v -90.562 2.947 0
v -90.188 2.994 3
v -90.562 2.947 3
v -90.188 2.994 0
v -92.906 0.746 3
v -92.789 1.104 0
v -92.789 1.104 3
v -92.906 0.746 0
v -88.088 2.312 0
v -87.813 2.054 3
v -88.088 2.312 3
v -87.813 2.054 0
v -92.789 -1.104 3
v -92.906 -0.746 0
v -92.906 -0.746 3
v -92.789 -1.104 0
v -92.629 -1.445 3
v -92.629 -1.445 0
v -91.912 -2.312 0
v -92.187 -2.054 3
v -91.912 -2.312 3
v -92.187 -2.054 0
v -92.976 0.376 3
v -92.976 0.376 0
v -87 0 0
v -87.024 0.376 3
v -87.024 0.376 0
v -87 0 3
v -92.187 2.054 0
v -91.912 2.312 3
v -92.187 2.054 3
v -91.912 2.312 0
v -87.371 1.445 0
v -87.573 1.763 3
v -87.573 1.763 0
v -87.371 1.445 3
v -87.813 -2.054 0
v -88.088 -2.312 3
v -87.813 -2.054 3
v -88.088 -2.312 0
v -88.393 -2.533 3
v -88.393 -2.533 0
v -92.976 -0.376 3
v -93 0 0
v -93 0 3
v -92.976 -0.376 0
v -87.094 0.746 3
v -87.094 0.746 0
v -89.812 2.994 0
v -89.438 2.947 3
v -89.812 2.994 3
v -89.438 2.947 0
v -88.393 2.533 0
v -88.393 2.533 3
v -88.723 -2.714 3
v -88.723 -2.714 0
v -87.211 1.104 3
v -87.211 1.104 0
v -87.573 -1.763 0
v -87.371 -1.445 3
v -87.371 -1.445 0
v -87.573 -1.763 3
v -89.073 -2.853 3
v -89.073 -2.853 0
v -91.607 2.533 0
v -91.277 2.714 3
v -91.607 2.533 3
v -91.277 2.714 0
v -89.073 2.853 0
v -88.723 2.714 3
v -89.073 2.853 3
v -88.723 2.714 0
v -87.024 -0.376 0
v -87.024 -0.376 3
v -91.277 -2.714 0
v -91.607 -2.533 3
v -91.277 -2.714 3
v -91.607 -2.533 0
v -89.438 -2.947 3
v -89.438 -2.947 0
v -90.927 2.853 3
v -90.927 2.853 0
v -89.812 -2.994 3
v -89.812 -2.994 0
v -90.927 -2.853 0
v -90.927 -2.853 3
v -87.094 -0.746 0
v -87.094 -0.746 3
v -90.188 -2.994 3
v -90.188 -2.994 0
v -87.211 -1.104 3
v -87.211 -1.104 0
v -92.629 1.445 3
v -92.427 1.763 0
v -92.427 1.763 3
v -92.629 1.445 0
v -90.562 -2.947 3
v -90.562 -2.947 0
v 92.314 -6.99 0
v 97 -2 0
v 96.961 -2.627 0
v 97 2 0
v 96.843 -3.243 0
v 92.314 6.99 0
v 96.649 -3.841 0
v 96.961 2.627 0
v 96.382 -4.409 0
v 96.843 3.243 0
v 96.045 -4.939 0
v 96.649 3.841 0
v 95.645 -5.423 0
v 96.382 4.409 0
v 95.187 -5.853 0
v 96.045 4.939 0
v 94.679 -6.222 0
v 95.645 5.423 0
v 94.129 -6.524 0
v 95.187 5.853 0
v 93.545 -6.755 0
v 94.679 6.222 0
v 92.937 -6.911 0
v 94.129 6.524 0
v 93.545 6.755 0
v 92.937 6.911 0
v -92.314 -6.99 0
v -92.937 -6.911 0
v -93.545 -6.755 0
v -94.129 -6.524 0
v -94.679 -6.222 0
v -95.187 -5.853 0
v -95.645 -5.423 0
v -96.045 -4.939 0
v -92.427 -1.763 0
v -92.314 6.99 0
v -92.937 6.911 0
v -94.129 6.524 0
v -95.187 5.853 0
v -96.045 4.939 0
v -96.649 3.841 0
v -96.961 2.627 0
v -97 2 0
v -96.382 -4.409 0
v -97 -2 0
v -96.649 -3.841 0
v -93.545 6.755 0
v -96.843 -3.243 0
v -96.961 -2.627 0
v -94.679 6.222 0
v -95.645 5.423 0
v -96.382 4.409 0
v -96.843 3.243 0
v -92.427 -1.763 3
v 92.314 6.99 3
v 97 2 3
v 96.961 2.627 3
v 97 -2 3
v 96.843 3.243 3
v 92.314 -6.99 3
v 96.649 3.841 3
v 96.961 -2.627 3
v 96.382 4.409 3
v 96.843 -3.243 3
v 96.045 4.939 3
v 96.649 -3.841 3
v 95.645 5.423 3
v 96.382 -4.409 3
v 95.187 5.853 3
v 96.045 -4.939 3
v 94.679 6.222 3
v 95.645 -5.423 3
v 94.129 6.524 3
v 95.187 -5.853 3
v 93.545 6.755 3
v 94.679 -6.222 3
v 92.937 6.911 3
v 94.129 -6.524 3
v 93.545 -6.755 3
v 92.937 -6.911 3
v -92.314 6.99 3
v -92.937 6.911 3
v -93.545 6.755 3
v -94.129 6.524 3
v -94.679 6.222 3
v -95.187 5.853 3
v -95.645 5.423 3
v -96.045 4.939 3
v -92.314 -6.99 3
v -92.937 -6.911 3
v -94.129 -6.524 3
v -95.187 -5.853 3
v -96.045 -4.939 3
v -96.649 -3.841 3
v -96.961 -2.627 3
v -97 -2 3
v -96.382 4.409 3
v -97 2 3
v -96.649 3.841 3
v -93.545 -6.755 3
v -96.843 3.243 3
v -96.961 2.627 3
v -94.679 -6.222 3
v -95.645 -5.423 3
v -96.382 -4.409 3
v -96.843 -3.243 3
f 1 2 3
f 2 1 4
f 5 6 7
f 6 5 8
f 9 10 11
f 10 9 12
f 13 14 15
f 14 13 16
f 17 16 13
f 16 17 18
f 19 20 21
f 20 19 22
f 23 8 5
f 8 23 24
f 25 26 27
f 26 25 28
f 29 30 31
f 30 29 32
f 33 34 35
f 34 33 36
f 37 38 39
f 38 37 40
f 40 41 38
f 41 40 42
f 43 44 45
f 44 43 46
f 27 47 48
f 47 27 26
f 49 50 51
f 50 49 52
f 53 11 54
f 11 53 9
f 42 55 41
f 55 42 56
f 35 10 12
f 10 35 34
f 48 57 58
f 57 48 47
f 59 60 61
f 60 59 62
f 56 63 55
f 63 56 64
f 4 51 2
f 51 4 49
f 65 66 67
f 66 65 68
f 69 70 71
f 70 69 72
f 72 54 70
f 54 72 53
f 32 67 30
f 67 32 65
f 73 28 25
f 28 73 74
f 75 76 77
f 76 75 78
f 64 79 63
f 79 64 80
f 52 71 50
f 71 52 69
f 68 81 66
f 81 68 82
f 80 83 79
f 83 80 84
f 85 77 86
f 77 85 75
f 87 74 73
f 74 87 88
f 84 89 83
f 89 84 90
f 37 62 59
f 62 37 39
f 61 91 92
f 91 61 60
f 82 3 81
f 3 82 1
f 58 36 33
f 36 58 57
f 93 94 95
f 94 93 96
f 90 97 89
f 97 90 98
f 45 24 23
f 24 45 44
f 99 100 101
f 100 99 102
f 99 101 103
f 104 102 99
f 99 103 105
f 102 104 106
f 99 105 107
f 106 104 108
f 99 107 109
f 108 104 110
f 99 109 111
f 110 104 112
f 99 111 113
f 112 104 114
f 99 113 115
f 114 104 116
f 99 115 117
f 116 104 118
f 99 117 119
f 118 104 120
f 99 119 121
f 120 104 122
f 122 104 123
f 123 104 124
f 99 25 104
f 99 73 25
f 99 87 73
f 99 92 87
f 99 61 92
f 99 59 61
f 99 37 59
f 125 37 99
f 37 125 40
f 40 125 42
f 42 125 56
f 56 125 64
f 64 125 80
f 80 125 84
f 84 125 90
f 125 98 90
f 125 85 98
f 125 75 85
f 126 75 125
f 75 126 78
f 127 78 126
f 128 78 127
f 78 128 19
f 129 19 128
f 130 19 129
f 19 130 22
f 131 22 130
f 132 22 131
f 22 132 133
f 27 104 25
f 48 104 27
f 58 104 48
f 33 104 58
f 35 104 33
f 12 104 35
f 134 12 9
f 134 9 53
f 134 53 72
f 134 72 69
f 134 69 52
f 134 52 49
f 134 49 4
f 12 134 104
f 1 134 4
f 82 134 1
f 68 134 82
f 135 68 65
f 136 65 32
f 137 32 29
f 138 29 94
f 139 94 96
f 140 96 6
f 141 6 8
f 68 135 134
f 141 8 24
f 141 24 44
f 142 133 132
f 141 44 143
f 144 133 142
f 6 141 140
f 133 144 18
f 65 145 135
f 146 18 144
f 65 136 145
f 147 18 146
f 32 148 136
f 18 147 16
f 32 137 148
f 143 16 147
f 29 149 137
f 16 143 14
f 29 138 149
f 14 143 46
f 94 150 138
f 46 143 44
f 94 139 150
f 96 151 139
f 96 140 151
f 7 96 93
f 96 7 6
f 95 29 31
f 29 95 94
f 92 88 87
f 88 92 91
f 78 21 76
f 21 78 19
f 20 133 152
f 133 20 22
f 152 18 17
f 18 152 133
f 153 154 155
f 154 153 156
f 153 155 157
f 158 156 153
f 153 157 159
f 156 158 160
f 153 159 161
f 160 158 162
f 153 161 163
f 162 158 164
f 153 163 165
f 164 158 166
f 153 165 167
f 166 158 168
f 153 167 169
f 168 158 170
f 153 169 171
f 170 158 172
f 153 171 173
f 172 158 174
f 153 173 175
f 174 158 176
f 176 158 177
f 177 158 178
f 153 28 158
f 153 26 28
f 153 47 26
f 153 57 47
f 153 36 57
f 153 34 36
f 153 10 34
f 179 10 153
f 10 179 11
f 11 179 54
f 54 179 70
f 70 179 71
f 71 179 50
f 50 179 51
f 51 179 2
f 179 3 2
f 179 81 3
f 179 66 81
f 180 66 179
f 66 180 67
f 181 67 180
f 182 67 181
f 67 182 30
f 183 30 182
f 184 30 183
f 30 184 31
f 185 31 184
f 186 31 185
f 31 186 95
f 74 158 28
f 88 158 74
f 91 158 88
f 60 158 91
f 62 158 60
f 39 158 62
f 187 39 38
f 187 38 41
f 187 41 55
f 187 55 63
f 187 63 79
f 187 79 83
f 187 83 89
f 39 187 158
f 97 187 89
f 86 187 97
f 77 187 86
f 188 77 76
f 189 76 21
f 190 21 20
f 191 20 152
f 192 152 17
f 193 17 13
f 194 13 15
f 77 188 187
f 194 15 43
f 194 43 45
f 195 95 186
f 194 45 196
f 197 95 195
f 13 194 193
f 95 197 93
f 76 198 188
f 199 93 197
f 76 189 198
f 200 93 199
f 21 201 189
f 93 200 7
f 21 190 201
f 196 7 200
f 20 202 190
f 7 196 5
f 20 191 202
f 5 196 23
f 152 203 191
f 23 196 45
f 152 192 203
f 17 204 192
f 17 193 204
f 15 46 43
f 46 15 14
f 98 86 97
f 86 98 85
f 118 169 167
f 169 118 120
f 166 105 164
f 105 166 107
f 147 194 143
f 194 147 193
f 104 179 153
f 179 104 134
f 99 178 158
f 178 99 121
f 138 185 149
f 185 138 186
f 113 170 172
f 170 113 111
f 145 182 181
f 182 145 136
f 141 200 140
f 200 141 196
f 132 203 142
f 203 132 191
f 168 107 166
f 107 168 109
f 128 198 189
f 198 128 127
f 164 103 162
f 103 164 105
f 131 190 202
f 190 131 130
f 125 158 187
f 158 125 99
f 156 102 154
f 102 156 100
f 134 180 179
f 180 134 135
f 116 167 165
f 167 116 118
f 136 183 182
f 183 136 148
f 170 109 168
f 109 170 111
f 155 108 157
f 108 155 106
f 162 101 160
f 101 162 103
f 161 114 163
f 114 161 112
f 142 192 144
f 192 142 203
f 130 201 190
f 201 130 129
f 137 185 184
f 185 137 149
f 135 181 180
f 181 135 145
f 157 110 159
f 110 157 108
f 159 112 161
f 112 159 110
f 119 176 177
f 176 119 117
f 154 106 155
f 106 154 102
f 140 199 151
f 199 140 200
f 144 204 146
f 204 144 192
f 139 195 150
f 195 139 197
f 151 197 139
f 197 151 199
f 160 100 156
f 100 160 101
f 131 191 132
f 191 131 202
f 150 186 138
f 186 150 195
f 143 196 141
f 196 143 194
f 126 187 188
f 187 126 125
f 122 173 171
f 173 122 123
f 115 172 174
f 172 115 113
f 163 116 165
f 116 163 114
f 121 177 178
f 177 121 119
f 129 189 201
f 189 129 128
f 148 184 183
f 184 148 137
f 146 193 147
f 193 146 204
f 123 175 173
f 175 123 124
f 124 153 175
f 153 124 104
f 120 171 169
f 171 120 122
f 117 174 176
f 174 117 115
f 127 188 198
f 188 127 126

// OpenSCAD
$fn = 50;


difference() {
	union() {
		hull() {
			translate(v = [-92.0000000000, 2.0000000000, 0]) {
				cylinder(h = 3, r = 5);
			}
			translate(v = [92.0000000000, 2.0000000000, 0]) {
				cylinder(h = 3, r = 5);
			}
			translate(v = [-92.0000000000, -2.0000000000, 0]) {
				cylinder(h = 3, r = 5);
			}
			translate(v = [92.0000000000, -2.0000000000, 0]) {
				cylinder(h = 3, r = 5);
			}
		}
	}
	union() {
		translate(v = [-90.0000000000, 0.0000000000, 0]) {
			cylinder(h = 3, r = 3.0000000000);
		}
		translate(v = [-90.0000000000, 0.0000000000, 0]) {
			cylinder(h = 3, r = 1.5000000000);
		}
		translate(v = [-90.0000000000, 0.0000000000, 0]) {
			cylinder(h = 3, r = 1.5000000000);
		}
		translate(v = [-90.0000000000, 0.0000000000, 0]) {
			cylinder(h = 3, r = 1.5000000000);
		}
	}
}
